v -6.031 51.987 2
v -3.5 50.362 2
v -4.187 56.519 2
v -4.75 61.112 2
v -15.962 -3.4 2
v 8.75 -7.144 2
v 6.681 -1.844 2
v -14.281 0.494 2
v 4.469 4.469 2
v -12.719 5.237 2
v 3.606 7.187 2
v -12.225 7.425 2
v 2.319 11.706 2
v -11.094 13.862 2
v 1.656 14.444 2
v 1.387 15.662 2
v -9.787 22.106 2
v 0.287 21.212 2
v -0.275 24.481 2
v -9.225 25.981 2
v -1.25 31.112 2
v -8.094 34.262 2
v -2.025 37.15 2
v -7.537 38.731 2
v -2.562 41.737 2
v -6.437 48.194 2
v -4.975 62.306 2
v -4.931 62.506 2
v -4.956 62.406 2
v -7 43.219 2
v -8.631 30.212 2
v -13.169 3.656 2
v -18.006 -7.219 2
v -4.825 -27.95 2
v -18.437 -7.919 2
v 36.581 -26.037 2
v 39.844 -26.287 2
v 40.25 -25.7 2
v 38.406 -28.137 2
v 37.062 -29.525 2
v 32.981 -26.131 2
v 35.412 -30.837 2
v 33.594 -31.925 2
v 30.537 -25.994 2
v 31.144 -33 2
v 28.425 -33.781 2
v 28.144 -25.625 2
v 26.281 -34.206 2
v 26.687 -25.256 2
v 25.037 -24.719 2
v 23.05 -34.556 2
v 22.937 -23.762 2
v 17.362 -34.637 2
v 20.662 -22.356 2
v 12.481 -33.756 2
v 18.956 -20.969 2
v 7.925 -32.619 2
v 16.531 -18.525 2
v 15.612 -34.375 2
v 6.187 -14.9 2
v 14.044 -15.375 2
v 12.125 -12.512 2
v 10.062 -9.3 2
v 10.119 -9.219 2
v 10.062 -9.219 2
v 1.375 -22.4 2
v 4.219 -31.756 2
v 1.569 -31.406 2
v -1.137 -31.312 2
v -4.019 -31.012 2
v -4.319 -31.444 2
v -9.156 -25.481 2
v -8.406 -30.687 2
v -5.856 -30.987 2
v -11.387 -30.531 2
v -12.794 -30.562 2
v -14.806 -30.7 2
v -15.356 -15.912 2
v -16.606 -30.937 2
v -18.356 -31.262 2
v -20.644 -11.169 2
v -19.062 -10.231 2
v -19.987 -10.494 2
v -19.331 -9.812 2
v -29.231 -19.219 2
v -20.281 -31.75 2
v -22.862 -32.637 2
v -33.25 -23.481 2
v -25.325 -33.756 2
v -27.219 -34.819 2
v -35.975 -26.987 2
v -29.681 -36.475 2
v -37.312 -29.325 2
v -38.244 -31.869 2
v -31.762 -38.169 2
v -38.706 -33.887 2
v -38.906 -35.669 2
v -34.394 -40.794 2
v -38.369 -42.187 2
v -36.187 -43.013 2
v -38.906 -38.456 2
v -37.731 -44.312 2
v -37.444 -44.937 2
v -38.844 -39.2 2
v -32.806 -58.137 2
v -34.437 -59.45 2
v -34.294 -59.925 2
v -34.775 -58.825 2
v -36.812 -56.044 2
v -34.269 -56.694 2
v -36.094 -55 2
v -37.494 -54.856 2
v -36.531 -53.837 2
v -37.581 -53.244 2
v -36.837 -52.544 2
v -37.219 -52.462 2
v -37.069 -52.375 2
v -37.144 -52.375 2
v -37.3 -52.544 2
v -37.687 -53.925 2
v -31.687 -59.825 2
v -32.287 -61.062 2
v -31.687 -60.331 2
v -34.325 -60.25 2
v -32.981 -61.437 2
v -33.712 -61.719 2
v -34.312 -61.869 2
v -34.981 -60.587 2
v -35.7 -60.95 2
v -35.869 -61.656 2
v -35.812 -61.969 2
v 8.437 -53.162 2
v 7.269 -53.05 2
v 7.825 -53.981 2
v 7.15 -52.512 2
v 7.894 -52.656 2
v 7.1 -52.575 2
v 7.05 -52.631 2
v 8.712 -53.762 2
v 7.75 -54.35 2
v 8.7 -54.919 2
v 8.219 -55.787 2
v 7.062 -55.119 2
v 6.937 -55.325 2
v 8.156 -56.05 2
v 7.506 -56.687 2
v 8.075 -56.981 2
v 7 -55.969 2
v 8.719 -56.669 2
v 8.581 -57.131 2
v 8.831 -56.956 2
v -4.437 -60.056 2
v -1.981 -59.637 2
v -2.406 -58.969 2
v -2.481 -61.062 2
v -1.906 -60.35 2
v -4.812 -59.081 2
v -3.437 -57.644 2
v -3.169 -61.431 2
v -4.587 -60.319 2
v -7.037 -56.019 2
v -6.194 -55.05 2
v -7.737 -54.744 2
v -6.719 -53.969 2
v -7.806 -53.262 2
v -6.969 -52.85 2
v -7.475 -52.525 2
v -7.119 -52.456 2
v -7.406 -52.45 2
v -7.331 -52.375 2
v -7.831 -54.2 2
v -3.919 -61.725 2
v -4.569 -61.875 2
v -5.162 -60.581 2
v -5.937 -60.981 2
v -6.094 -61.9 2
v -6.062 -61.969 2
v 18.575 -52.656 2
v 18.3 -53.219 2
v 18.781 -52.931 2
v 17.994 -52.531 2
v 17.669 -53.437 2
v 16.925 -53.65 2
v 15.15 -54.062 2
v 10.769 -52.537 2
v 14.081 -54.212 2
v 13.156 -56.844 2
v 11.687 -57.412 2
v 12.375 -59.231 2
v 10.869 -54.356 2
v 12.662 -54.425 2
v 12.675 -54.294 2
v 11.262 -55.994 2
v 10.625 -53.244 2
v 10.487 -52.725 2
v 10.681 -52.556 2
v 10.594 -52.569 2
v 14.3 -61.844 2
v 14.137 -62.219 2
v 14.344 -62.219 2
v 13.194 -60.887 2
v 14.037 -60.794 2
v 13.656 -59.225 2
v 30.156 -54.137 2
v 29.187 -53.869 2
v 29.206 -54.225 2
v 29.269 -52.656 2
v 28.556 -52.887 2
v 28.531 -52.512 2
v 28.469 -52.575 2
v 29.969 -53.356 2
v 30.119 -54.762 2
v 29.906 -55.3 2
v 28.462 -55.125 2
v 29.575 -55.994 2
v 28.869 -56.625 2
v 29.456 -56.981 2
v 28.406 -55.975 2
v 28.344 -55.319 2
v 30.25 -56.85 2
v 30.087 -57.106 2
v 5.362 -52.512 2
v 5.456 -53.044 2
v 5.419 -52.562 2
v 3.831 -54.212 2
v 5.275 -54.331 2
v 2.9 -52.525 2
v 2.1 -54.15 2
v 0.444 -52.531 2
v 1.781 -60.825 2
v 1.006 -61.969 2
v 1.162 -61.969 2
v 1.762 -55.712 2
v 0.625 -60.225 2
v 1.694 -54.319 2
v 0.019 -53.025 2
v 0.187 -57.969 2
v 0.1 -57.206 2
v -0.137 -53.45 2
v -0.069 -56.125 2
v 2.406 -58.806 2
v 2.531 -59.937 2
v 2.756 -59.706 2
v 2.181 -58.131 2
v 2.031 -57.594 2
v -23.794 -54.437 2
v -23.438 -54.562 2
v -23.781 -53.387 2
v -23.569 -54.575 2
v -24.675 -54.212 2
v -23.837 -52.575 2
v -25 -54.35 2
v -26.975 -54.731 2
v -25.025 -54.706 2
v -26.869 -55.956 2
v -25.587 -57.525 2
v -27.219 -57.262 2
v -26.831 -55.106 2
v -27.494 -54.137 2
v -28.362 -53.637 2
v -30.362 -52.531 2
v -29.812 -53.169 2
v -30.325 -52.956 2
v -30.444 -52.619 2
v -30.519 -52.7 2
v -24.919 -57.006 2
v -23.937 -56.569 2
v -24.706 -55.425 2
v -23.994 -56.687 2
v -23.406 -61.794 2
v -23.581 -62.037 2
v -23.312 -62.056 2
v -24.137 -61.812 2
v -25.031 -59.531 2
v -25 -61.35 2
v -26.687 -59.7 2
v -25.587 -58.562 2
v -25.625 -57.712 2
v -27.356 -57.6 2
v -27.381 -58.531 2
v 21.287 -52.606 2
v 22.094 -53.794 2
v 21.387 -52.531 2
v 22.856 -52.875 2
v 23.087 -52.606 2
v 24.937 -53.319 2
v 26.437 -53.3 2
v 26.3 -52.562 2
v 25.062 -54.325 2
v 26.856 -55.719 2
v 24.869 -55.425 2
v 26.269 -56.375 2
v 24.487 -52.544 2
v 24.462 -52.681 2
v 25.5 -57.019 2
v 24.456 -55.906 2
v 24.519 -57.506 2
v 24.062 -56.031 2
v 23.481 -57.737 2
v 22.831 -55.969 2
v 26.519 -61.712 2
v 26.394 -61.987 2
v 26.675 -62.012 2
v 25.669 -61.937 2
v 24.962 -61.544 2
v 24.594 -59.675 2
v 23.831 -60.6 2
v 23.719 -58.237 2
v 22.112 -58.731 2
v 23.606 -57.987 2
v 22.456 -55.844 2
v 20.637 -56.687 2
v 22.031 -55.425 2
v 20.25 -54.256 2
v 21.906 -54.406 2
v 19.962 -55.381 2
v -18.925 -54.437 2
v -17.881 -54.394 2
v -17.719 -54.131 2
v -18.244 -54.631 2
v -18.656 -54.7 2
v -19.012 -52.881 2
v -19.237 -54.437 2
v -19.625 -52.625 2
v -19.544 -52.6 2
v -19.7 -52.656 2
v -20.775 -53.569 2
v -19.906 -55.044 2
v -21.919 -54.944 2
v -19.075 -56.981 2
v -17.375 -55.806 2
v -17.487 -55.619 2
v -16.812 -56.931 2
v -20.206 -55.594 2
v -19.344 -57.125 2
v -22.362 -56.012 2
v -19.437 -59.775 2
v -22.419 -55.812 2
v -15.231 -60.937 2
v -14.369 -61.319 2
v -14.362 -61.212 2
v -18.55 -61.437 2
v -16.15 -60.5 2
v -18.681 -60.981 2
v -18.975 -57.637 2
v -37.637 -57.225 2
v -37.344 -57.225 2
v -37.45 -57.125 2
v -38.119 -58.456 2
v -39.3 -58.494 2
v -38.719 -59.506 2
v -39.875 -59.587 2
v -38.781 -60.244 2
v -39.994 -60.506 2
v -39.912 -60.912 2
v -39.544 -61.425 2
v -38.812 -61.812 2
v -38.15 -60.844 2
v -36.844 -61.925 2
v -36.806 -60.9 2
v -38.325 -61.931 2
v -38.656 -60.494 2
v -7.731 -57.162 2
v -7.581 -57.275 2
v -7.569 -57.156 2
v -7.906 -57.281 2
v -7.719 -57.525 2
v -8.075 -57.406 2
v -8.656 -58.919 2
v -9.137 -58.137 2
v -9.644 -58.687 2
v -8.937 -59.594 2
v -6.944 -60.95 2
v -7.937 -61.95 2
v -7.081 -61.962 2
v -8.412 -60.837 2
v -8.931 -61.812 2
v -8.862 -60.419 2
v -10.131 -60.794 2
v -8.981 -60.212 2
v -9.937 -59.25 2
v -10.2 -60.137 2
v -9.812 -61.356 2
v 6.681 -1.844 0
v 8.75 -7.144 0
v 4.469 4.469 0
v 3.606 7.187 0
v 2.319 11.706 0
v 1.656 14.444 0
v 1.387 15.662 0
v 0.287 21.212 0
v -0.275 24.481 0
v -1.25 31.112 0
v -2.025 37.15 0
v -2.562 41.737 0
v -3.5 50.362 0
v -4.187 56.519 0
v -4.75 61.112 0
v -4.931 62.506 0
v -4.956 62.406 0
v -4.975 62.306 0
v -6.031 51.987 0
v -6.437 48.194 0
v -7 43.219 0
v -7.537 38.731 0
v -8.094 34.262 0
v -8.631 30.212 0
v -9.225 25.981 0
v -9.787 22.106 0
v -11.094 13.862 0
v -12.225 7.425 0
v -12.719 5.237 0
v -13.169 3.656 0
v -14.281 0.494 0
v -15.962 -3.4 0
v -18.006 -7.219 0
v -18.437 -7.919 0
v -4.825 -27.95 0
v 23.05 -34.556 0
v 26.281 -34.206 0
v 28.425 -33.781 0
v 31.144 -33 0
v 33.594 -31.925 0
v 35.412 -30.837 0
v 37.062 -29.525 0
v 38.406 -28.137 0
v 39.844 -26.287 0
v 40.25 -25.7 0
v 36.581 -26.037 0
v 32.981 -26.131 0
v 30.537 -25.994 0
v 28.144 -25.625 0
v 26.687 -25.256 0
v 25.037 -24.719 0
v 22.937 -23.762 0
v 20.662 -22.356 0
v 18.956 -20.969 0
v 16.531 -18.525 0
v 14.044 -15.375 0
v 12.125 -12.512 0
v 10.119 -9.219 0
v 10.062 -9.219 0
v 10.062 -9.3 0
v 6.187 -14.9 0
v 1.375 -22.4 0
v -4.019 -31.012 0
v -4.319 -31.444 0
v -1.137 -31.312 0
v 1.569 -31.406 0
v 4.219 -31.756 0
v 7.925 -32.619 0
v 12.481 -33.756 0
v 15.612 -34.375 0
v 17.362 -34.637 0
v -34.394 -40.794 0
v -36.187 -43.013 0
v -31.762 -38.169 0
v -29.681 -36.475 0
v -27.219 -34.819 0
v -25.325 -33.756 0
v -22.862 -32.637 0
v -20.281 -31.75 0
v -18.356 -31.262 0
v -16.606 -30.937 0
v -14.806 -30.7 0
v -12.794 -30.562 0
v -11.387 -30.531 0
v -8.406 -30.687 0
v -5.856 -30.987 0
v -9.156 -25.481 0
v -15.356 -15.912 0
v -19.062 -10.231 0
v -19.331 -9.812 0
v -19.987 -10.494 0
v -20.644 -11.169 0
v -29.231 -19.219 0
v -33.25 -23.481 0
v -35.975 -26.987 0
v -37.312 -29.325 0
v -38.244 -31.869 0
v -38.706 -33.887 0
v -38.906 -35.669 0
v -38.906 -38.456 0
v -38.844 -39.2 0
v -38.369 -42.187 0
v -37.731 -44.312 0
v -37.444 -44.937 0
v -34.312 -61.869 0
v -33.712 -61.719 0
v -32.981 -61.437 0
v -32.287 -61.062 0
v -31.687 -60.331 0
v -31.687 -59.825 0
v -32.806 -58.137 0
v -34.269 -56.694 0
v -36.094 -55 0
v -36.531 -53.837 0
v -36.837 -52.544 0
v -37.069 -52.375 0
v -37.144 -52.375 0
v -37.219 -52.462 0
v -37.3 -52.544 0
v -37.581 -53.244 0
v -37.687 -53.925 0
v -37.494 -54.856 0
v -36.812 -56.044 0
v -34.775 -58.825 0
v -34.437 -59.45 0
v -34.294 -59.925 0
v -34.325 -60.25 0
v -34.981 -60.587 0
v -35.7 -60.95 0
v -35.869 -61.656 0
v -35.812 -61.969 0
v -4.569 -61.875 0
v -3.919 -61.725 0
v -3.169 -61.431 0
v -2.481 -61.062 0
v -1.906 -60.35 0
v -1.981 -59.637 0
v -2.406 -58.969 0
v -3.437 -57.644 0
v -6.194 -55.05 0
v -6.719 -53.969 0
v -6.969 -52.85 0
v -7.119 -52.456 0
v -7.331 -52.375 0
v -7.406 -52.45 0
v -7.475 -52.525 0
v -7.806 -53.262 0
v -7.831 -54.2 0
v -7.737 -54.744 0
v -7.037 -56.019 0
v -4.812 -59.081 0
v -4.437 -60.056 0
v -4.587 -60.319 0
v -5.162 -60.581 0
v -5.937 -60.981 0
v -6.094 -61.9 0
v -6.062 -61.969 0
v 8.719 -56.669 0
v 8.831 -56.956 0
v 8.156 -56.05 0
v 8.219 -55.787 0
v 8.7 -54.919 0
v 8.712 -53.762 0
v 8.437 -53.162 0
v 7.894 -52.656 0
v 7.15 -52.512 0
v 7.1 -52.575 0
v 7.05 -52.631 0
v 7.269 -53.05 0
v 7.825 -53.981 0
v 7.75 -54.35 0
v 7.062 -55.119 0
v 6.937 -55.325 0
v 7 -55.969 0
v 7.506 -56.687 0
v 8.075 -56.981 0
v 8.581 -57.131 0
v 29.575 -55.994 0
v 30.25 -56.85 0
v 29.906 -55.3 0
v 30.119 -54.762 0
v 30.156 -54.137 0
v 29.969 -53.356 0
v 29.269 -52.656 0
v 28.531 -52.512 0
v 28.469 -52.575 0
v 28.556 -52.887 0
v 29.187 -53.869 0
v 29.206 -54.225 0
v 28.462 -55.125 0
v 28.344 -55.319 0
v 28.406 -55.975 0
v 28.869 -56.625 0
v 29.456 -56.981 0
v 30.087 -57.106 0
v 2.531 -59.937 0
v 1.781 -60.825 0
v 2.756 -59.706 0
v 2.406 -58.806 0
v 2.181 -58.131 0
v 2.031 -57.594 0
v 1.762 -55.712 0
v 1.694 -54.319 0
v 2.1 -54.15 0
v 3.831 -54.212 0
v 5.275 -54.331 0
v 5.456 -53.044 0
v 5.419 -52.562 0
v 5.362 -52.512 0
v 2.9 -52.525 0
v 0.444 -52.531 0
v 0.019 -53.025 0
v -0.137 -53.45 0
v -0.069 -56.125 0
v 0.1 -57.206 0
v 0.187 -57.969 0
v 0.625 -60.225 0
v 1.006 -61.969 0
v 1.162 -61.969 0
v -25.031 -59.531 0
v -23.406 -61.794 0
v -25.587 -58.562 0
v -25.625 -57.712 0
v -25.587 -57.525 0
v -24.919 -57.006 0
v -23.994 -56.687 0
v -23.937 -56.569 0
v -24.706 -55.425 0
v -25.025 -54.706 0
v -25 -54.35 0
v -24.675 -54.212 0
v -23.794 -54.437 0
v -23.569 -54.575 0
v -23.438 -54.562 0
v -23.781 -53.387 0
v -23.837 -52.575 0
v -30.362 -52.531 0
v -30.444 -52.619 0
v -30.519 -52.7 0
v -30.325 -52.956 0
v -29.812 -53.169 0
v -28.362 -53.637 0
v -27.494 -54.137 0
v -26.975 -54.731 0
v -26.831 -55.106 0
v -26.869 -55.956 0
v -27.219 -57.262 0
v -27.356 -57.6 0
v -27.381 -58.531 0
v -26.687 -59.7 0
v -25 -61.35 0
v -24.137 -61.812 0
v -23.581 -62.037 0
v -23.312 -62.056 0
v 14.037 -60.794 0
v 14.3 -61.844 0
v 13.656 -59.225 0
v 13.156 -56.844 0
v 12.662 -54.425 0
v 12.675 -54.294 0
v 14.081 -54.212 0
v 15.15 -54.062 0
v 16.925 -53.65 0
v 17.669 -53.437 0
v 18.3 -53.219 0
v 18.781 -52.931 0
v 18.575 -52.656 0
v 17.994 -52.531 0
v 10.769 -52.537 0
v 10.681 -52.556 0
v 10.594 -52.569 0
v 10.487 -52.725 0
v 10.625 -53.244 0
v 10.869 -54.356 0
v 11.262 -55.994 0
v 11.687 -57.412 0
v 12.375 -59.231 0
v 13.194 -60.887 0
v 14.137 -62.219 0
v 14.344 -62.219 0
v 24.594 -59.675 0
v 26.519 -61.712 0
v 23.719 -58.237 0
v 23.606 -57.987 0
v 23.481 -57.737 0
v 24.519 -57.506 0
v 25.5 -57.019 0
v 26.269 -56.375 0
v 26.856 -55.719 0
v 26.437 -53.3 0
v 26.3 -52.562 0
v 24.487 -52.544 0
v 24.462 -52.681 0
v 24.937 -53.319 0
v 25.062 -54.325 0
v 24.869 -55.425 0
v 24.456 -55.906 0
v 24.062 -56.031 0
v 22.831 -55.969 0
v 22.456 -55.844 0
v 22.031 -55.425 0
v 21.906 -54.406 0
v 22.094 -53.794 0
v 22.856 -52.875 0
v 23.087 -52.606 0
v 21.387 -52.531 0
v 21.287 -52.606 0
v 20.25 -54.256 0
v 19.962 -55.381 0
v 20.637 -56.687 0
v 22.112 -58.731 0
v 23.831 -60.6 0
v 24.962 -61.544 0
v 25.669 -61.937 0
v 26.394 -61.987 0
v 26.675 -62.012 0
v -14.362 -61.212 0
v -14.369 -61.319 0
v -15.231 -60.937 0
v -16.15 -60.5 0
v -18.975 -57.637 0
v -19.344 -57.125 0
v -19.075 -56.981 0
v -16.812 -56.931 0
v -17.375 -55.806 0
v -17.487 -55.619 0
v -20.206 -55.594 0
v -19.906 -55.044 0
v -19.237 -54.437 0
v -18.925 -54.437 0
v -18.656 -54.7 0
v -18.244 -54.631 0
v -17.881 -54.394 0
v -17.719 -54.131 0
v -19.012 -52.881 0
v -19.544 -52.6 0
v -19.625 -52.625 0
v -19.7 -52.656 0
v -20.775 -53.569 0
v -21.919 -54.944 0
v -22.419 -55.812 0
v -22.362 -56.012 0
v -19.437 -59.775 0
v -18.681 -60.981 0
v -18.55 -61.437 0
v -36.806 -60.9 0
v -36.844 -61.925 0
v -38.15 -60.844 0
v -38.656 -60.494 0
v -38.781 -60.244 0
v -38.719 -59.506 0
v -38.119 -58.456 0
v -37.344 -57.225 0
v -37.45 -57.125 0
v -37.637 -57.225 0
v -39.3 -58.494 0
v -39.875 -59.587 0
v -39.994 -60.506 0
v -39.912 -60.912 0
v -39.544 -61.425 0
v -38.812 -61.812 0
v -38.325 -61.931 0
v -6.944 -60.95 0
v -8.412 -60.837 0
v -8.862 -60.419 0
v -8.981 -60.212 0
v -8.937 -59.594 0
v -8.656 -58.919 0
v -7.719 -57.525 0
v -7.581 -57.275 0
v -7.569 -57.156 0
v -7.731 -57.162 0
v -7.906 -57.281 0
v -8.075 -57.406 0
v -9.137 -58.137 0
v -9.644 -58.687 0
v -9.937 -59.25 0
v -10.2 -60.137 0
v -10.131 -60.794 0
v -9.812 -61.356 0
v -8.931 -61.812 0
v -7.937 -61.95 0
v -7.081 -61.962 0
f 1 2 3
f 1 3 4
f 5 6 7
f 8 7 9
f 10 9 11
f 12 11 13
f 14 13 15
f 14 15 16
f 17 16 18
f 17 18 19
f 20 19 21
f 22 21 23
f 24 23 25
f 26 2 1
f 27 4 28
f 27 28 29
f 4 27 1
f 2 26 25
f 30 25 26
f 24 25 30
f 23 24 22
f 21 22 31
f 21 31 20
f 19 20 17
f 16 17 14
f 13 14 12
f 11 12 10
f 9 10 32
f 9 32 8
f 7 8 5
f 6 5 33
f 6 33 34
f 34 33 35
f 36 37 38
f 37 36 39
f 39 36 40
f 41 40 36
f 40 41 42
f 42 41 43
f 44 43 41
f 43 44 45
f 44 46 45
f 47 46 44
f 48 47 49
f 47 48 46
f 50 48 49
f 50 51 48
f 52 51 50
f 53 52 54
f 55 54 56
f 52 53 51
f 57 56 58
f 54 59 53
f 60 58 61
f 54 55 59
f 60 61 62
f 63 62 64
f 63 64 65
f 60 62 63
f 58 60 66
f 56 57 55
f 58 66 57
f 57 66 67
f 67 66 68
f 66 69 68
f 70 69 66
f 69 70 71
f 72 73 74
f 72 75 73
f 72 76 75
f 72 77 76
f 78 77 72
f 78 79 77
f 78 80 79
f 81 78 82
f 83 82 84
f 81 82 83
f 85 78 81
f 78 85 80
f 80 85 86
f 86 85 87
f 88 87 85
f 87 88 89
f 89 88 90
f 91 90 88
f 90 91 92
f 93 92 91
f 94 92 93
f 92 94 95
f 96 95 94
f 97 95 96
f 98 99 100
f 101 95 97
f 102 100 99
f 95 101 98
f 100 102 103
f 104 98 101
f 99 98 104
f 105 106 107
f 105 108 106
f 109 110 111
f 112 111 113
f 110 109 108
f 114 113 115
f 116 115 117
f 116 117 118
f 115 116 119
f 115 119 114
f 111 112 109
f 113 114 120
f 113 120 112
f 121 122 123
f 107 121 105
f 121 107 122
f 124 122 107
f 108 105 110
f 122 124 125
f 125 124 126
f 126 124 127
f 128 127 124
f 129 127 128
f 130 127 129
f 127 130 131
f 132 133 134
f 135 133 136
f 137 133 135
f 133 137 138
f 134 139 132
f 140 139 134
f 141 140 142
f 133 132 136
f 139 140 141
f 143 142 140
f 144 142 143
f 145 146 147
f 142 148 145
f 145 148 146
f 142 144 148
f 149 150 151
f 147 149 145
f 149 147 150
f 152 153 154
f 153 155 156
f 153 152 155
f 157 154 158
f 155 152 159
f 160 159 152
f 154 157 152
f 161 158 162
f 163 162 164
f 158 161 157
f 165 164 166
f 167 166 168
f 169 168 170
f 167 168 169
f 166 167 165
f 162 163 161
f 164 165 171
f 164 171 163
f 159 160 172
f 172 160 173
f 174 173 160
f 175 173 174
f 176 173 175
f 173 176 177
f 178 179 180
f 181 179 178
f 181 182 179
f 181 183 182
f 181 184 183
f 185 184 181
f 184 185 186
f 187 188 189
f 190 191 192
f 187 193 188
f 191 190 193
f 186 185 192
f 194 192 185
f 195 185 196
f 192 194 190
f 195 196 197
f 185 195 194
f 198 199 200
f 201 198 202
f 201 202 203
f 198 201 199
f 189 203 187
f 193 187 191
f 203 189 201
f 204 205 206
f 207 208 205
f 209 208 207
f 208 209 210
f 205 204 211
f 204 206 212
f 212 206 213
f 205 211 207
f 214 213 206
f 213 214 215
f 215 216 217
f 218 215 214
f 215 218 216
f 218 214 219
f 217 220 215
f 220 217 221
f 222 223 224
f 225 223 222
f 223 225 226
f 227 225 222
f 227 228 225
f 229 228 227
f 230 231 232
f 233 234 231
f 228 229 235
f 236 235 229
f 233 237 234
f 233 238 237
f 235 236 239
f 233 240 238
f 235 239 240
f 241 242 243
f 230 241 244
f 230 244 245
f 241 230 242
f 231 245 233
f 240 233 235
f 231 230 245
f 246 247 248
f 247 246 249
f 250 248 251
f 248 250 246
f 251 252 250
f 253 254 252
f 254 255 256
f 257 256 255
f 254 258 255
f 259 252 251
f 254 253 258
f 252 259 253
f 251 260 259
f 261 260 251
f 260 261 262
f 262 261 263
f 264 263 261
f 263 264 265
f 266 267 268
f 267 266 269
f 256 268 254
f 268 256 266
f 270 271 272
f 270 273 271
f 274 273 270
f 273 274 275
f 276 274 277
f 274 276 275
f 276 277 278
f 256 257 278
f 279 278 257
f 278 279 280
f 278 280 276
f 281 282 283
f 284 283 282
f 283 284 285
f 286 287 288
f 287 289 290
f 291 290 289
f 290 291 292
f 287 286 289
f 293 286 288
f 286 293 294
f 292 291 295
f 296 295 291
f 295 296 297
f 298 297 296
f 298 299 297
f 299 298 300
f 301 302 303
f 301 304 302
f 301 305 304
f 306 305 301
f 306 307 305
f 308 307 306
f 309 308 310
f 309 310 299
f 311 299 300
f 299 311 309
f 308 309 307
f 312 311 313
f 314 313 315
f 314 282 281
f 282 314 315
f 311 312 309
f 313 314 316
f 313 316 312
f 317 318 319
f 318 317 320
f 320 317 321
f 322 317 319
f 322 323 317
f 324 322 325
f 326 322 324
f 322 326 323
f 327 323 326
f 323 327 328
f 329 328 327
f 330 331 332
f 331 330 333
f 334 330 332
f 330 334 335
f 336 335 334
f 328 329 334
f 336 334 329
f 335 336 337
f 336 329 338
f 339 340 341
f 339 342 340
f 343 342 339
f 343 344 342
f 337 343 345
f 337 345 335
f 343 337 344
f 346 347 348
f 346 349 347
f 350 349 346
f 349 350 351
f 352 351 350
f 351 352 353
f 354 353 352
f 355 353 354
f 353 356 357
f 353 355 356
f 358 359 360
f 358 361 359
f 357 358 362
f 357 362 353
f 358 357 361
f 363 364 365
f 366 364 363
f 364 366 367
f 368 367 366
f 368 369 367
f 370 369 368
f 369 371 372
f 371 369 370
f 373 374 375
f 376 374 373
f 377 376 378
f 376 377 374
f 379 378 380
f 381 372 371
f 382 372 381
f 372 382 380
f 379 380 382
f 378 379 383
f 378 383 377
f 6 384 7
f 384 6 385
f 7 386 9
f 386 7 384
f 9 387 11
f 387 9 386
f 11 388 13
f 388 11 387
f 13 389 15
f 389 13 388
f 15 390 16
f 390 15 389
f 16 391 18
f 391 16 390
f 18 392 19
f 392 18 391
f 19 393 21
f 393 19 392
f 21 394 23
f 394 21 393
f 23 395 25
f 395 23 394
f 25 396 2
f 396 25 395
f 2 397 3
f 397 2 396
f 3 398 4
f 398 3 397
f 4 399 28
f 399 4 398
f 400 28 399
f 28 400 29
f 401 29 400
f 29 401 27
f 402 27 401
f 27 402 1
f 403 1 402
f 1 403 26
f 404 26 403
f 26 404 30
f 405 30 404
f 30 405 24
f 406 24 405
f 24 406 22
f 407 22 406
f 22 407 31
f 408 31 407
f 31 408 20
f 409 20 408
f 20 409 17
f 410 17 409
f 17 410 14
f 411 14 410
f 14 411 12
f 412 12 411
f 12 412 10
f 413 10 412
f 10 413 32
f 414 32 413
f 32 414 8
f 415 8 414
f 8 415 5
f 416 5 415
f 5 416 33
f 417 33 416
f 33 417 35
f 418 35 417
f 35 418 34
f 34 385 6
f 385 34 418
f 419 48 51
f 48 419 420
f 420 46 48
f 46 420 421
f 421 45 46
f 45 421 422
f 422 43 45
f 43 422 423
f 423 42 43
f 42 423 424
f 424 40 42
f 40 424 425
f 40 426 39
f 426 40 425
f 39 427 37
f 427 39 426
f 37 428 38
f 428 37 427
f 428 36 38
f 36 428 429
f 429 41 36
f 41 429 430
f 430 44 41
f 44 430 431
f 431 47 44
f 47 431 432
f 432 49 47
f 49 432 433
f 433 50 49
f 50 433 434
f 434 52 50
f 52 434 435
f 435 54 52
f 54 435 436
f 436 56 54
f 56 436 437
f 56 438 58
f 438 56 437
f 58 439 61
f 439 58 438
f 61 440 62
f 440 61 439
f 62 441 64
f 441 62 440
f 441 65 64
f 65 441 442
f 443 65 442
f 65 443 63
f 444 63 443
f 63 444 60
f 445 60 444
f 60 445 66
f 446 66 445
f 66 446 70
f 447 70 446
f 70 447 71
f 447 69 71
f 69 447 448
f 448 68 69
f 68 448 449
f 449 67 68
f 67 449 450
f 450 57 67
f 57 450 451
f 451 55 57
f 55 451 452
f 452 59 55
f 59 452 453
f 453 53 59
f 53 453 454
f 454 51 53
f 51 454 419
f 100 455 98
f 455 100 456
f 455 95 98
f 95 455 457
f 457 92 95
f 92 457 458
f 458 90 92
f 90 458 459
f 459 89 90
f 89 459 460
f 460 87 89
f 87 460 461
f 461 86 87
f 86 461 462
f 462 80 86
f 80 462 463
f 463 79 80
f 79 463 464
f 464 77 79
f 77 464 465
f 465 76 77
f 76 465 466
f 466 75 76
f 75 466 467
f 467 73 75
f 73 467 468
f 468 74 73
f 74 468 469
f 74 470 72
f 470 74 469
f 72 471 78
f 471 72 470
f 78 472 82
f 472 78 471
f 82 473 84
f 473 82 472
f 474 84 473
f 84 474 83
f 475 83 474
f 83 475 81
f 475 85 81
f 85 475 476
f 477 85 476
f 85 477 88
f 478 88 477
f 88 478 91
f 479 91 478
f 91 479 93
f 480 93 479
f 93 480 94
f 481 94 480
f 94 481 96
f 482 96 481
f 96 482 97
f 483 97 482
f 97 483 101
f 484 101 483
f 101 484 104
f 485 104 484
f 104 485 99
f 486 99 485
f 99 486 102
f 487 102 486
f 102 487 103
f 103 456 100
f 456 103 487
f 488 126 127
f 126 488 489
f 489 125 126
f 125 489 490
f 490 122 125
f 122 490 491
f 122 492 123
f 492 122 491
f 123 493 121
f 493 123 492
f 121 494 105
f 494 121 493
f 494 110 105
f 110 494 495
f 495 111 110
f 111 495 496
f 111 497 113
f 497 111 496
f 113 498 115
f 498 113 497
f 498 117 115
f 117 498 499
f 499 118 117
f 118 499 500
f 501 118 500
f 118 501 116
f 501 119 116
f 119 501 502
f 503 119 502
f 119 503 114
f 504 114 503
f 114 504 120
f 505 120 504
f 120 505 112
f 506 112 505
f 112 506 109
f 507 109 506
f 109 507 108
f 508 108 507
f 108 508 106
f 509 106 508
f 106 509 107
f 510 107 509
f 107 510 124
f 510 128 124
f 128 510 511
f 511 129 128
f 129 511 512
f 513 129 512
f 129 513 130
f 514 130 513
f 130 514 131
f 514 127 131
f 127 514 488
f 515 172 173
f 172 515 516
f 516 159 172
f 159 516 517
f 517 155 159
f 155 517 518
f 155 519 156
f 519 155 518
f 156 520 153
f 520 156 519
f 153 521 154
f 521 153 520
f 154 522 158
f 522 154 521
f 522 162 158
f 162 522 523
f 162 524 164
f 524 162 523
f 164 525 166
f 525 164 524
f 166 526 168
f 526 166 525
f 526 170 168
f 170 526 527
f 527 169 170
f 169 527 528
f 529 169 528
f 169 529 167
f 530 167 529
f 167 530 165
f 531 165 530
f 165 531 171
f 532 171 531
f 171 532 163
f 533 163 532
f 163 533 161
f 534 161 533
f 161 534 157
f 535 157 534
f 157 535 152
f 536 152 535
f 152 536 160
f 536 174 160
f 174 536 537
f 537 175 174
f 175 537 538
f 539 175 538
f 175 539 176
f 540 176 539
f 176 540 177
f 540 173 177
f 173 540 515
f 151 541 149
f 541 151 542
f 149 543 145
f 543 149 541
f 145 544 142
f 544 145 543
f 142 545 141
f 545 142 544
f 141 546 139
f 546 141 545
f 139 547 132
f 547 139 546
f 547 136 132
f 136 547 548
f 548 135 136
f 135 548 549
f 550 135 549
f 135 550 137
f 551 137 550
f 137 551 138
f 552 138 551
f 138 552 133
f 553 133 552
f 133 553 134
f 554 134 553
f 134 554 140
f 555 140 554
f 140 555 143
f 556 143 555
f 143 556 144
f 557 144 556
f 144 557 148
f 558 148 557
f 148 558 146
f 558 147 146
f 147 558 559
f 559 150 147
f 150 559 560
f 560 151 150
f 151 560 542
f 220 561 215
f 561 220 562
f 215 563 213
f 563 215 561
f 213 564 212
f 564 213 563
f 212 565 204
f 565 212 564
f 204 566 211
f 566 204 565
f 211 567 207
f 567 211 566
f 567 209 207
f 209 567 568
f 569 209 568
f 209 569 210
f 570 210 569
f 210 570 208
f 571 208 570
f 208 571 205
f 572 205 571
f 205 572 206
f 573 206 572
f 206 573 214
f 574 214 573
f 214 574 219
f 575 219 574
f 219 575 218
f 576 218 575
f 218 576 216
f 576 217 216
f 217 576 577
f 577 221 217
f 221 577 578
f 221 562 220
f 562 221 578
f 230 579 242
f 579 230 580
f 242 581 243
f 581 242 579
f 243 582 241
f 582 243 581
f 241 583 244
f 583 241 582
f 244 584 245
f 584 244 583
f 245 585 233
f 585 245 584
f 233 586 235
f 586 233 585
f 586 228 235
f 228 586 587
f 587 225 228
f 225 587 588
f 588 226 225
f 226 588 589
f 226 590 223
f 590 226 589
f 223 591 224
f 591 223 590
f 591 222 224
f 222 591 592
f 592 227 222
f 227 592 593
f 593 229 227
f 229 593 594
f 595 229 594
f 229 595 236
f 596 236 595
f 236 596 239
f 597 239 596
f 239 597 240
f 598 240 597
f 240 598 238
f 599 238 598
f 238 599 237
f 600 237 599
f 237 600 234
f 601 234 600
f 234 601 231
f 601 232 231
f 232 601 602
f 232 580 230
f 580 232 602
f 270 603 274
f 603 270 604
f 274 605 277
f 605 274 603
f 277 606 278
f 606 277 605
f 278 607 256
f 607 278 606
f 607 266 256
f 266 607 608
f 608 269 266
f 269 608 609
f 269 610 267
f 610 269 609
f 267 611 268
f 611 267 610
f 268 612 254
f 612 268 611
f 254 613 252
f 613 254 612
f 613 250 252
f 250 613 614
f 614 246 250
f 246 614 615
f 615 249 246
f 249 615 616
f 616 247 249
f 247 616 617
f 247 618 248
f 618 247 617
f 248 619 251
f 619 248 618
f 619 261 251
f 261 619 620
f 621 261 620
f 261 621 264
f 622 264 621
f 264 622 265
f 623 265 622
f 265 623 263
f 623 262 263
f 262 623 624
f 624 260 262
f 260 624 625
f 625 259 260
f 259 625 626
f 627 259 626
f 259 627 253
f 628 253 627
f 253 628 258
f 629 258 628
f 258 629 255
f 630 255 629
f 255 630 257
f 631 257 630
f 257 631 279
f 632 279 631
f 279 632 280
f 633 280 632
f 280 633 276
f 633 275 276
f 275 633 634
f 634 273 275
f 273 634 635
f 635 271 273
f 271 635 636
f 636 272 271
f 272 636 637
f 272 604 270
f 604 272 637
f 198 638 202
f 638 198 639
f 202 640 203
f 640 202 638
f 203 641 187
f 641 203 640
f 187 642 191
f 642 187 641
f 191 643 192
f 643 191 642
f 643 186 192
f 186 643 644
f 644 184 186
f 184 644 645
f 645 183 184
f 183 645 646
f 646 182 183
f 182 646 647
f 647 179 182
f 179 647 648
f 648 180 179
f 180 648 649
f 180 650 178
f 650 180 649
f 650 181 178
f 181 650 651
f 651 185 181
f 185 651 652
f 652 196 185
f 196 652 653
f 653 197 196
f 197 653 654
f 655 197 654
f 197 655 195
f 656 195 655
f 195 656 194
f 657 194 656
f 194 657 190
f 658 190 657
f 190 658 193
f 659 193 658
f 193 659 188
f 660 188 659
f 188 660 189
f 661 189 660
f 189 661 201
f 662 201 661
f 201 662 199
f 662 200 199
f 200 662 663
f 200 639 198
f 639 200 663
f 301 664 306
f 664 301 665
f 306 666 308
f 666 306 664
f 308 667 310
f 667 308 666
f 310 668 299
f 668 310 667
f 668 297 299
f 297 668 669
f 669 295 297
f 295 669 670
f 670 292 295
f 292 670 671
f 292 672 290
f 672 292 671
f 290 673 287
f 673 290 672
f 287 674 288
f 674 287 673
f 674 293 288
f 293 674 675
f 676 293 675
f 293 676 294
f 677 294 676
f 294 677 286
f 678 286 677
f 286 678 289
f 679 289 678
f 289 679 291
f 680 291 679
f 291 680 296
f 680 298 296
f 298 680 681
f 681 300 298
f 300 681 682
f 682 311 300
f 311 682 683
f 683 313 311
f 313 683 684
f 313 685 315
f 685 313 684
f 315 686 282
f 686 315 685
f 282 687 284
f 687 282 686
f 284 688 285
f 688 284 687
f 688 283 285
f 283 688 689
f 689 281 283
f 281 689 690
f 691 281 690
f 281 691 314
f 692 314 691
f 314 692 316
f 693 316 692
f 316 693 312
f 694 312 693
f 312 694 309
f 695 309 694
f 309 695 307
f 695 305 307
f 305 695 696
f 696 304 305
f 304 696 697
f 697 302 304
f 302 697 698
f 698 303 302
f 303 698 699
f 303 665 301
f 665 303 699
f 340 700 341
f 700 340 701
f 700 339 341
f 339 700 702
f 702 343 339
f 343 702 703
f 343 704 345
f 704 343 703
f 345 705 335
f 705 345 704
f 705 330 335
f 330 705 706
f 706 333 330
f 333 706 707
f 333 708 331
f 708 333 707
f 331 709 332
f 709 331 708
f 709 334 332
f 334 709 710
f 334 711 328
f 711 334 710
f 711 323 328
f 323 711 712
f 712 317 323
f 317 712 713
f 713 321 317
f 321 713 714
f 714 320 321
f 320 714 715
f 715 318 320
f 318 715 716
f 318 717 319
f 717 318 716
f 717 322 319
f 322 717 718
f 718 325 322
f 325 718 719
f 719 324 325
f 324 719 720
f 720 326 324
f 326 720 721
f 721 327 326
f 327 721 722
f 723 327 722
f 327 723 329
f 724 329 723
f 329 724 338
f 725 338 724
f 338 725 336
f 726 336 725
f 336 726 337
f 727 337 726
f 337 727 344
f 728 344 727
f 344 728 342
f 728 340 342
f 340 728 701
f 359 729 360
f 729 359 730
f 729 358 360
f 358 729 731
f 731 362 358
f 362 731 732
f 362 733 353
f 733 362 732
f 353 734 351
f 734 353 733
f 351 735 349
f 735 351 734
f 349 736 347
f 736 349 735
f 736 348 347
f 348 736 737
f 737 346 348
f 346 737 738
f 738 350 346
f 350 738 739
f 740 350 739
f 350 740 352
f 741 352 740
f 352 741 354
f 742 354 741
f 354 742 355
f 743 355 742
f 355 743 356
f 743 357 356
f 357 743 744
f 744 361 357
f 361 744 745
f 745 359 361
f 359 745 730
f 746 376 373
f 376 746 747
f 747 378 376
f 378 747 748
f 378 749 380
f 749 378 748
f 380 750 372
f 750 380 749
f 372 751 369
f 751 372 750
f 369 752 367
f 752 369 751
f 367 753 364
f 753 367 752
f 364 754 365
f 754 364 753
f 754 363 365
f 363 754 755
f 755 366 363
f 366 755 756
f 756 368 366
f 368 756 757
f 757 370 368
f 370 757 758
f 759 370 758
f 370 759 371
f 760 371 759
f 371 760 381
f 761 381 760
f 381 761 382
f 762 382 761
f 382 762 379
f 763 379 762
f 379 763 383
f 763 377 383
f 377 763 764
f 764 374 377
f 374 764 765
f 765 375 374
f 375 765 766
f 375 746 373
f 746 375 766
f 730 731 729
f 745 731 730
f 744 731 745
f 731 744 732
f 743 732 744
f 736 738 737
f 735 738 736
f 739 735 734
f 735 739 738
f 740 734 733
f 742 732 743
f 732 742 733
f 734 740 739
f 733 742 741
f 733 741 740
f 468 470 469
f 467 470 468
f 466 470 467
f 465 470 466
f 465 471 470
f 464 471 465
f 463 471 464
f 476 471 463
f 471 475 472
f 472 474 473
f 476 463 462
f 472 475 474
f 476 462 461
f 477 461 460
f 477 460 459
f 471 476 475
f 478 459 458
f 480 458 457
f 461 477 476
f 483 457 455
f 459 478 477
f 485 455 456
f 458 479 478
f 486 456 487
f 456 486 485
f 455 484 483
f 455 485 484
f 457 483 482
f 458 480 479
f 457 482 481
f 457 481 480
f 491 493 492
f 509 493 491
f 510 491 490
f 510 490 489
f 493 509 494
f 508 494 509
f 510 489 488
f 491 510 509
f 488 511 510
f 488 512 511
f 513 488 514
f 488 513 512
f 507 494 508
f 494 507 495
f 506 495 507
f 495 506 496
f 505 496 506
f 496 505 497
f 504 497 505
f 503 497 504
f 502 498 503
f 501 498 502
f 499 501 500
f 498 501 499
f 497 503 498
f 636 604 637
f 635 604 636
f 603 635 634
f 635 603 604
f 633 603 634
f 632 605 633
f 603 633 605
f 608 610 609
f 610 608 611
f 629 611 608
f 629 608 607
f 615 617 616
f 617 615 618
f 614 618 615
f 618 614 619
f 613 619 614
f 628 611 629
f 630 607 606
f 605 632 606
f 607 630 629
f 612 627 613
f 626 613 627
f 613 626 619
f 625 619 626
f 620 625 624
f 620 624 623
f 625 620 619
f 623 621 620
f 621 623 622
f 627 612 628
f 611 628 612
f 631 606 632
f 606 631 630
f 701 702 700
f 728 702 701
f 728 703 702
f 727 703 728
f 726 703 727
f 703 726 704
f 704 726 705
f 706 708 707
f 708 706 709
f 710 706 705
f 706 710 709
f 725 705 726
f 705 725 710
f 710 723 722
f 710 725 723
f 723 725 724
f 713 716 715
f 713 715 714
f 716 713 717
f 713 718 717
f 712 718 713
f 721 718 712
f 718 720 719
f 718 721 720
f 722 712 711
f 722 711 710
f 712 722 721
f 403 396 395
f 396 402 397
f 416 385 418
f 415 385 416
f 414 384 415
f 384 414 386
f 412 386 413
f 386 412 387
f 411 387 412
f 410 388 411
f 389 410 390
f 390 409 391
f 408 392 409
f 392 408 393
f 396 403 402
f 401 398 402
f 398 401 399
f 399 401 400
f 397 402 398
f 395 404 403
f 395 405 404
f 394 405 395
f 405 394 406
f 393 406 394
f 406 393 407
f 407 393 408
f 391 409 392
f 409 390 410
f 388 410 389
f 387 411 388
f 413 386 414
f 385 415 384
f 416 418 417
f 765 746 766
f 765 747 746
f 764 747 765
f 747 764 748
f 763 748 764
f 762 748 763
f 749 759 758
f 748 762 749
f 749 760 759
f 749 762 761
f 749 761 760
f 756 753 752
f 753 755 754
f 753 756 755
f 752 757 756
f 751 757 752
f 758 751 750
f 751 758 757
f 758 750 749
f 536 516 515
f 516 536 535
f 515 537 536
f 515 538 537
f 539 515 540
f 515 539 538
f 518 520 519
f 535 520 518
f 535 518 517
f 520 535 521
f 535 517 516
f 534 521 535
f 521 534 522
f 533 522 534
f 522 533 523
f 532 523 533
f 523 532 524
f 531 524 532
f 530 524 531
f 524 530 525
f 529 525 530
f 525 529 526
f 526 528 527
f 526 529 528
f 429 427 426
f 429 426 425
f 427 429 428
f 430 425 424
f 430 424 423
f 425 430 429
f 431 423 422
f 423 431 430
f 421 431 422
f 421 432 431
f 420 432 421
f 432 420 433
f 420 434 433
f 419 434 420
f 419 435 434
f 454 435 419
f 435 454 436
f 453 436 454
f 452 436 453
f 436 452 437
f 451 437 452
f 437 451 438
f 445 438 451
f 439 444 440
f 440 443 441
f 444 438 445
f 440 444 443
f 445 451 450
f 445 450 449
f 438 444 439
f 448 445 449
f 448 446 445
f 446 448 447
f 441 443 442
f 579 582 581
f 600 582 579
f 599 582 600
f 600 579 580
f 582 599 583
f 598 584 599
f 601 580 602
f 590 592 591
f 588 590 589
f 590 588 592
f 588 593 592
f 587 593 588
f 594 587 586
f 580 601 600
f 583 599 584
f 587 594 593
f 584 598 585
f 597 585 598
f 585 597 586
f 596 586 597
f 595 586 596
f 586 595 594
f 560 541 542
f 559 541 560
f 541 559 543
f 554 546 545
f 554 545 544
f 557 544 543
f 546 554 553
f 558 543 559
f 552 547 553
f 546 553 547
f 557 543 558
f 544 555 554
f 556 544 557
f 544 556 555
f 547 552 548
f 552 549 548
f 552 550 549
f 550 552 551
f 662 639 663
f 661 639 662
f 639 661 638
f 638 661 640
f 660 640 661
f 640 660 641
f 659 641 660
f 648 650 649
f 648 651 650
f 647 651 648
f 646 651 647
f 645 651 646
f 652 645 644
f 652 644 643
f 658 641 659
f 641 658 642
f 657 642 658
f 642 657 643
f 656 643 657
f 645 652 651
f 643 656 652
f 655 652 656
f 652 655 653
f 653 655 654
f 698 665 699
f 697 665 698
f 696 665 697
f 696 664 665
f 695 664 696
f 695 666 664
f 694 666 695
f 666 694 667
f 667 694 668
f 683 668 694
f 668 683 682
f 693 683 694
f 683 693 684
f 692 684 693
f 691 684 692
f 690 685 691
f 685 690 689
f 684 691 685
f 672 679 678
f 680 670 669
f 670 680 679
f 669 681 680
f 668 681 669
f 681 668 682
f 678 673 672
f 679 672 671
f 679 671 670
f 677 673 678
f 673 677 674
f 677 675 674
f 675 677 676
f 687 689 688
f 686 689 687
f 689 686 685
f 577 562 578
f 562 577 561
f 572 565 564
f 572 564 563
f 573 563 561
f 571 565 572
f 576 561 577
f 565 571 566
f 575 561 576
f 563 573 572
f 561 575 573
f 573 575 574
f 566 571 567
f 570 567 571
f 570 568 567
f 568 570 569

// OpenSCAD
module 88f2518f77c5dc64dcaf8de23dc046bc_1()
{
 /* Generated by trace2scad version 20150415
    http://aggregate.org/MAKE/TRACE2SCAD/
    Optimized model has 387/4796 original points
 */
 color([0.48, 0.48, 0.48])
 assign(minx=0) /* polygon minx=39 */
 assign(miny=0) /* polygon miny=45 */
 assign(maxx=12880) /* polygon maxx=12880 */
 assign(maxy=20000) /* polygon maxy=20001 */
 assign(dx=maxx-minx)
 assign(dy=maxy-miny)
 assign(maxd=((dx>dy)?dx:dy))
 scale([1/maxd, 1/maxd, 1])
 translate([-minx-dx/2, -miny-dy/2, 0])
 linear_extrude(height=1, convexity=387)
 union() {
  union() {
   polygon([[5647,19985],[5644,19969],[5475,18318],[5410,17711],[5320,16915],[5234,16197],[5145,15482],[5059,14834],[4964,14157],[4874,13537],[4665,12218],[4484,11188],[4405,10838],[4333,10585],[4155,10079],[3886,9456],[3559,8845],[3490,8733],[5668,5528],[7840,8857],[7509,9705],[7155,10715],[7017,11150],[6811,11873],[6705,12311],[6662,12506],[6486,13394],[6396,13917],[6240,14978],[6116,15944],[6030,16678],[5880,18058],[5770,19043],[5680,19778],[5651,20001]], convexity=6);
   polygon([[8050,8518],[8050,8512],[7430,7616],[6660,6416],[5797,5038],[5749,4969],[6258,4990],[6691,4975],[7115,4919],[7708,4781],[8437,4599],[8938,4500],[9218,4458],[10128,4471],[10645,4527],[10988,4595],[11423,4720],[11815,4892],[12106,5066],[12370,5276],[12585,5498],[12815,5794],[12880,5888],[12293,5834],[11717,5819],[11326,5841],[10943,5900],[10710,5959],[10446,6045],[10110,6198],[9746,6423],[9473,6645],[9085,7036],[8687,7540],[8380,7998],[8059,8525],[8050,8525]], convexity=9);
   polygon([[3242,8321],[3137,8213],[1763,6925],[1120,6243],[684,5682],[470,5308],[321,4901],[247,4578],[215,4293],[215,3847],[225,3728],[301,3250],[403,2910],[449,2810],[650,3118],[937,3473],[1358,3893],[1691,4164],[2085,4429],[2388,4599],[2782,4778],[3195,4920],[3503,4998],[3783,5050],[4071,5088],[4393,5110],[4618,5115],[5095,5090],[5503,5042],[4975,5923],[3983,7454],[3390,8363],[3347,8430]], convexity=7);
   polygon([[485,1606],[472,1593],[427,1481],[410,1372],[441,1223],[550,1033],[876,588],[930,488],[953,412],[948,360],[843,306],[728,248],[701,135],[710,85],[950,101],[1046,125],[1163,170],[1274,230],[1370,347],[1370,428],[1191,698],[957,929],[665,1200],[595,1386],[546,1593],[509,1620],[497,1620]], convexity=8);
   polygon([[5255,1608],[5244,1596],[5191,1478],[5187,1328],[5202,1241],[5314,1037],[5670,547],[5730,391],[5706,349],[5614,307],[5490,243],[5465,96],[5470,85],[5709,100],[5813,124],[5933,171],[6043,230],[6135,344],[6123,458],[6055,565],[5890,777],[5449,1192],[5365,1365],[5325,1544],[5301,1607],[5267,1620]], convexity=8);
   polygon([[6904,1596],[6511,1595],[6443,1516],[6418,1448],[6429,1020],[6456,847],[6470,725],[6540,364],[6601,85],[6626,85],[6725,268],[6845,410],[6881,447],[6825,591],[6789,699],[6765,785],[6722,1086],[6711,1309],[6776,1336],[7053,1326],[7284,1307],[7313,1513],[7307,1590],[7298,1598]], convexity=10);
   polygon([[7576,1588],[7568,1579],[7603,1512],[7692,1363],[7680,1304],[7570,1181],[7550,1148],[7560,1045],[7641,930],[7732,883],[7813,859],[7853,887],[7835,933],[7745,1032],[7755,1074],[7832,1213],[7834,1398],[7790,1494],[7703,1575],[7584,1598]], convexity=10);
   polygon([[11000,1593],[10995,1588],[11009,1538],[11110,1381],[11113,1324],[10994,1180],[10975,1149],[10985,1044],[11059,940],[11153,883],[11254,863],[11280,904],[11172,1041],[11225,1152],[11259,1238],[11265,1338],[11235,1463],[11123,1575],[11005,1598]], convexity=10);
   polygon([[1569,1581],[1557,1568],[1588,1527],[1670,1493],[1902,1418],[2041,1338],[2124,1243],[2147,1183],[2141,1047],[2085,838],[2063,784],[2059,635],[2170,448],[2440,184],[2578,110],[2667,74],[2710,71],[2695,113],[2435,475],[2346,630],[2340,766],[2346,796],[2453,879],[2601,930],[2610,949],[2487,1132],[2436,1247],[2440,1304],[2492,1326],[2633,1290],[2669,1268],[2690,1270],[2635,1458],[2626,1588],[1582,1595]], convexity=13);
   polygon([[8149,1591],[8135,1589],[8118,1564],[8140,1481],[8179,1303],[8242,1041],[8310,814],[8420,523],[8551,258],[8702,45],[8735,45],[8728,105],[8686,273],[8625,524],[8545,905],[8466,1292],[8468,1313],[8693,1326],[8864,1350],[9148,1416],[9267,1450],[9368,1485],[9445,1531],[9412,1575],[9319,1595],[8163,1594]], convexity=9);
   polygon([[9854,1589],[9846,1583],[9680,1319],[9634,1139],[9742,930],[9978,603],[10253,304],[10434,153],[10547,90],[10663,82],[10708,78],[10683,126],[10375,452],[10235,682],[10217,722],[10197,762],[10363,799],[10520,877],[10643,980],[10737,1085],[10670,1472],[10648,1590],[10358,1593],[10354,1571],[10430,1469],[10450,1308],[10419,1132],[10353,1055],[10290,1035],[10093,1045],[10033,1065],[9965,1132],[9945,1295],[9975,1393],[10097,1540],[10134,1583],[9862,1595]], convexity=13);
   polygon([[3300,1580],[3288,1575],[3116,1429],[2933,1209],[2853,1070],[2862,1038],[3330,436],[3451,243],[3472,170],[4141,189],[4142,206],[4003,250],[3856,320],[3404,778],[3345,860],[3388,883],[3750,891],[3660,1071],[3642,1101],[3207,1105],[3255,1193],[3362,1290],[3412,1290],[3455,1248],[3521,1259],[3579,1297],[3605,1339],[3398,1539],[3313,1584]], convexity=12);
   polygon([[433,852],[418,844],[152,641],[60,466],[41,319],[54,254],[113,172],[230,110],[308,91],[545,92],[551,256],[336,265],[255,321],[235,361],[245,479],[341,647],[465,844],[448,860]], convexity=8);
   polygon([[5175,835],[5148,815],[4978,698],[4897,610],[4850,520],[4808,378],[4819,273],[4870,183],[5011,110],[5170,88],[5307,86],[5329,248],[5094,266],[5022,333],[5003,366],[5010,465],[5055,573],[5205,796],[5227,836],[5229,855],[5203,854]], convexity=8);
  }
 }
}

module 88f2518f77c5dc64dcaf8de23dc046bc()
{
 /* all layers combined, scaled to within a 1mm cube */
 scale([1, 1, 1/1])
 difference() {
  union() {
   scale([1,1,2]) translate([0,0,-0.5]) 88f2518f77c5dc64dcaf8de23dc046bc_1();
  }
  translate([0,0,-2]) cube([2,2,4],center=true);
 }
}

scale([125, 125, 2]) {
	88f2518f77c5dc64dcaf8de23dc046bc();
}
